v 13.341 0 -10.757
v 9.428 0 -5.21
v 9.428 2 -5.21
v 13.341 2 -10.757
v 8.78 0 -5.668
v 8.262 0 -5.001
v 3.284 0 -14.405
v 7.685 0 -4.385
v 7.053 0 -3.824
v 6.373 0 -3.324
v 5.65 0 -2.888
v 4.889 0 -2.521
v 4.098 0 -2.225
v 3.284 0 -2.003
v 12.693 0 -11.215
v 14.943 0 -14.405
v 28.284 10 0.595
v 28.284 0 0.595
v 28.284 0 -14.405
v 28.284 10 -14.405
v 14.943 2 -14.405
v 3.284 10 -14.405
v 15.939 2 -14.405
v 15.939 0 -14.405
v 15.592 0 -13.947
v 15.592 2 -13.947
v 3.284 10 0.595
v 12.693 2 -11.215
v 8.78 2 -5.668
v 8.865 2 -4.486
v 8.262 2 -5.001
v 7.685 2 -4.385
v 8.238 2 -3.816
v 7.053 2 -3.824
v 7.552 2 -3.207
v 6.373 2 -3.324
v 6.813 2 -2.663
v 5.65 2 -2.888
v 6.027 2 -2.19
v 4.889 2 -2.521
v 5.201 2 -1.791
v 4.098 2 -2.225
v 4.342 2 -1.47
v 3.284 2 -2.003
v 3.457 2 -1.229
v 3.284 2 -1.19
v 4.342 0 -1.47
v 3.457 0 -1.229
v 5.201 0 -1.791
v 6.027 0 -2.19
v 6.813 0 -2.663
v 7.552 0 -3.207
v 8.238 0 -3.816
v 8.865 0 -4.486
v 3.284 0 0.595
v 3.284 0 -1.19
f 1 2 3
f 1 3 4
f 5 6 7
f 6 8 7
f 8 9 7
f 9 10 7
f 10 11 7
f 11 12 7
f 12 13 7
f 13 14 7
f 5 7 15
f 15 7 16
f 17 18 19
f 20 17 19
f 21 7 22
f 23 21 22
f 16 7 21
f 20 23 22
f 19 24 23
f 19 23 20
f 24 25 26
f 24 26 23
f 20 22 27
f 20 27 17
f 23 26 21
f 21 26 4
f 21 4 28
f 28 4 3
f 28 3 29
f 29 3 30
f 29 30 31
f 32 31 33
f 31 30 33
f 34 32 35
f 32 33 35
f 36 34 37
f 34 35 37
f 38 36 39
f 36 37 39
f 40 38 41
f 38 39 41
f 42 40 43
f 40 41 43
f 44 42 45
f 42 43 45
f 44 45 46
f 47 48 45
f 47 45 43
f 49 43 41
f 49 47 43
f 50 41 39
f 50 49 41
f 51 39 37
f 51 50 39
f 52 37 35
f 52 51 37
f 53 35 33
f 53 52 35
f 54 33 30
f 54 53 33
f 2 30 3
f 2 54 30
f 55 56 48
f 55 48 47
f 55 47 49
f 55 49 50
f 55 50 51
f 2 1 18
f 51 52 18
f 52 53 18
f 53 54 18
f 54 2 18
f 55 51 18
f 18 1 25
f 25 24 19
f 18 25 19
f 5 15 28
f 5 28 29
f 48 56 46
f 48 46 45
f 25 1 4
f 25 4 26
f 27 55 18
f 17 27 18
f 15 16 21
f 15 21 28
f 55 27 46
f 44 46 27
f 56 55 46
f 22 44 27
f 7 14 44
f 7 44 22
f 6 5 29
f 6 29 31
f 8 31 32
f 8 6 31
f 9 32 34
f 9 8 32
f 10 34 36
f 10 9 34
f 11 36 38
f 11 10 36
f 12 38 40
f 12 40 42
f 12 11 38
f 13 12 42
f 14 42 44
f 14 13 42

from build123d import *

# Parameters (mm, degrees)
SKETCH3_W           = 25
SKETCH3_H           = 15
BOSS_EXTRUDE1_DEPTH = 10
CUT_EXTRUDE1_DEPTH  = 2


with BuildPart() as part:
    # Sketch3 → Boss-Extrude1 (new body)
    with BuildSketch(Plane(origin=(0, 0, 0), x_dir=(1, 0, 0), z_dir=(0, 1, 0))):
        with Locations((15.783531292, 6.904865991)):
            Rectangle(SKETCH3_W, SKETCH3_H)
    extrude(amount=BOSS_EXTRUDE1_DEPTH)

    # Sketch4 → Cut-Extrude1 (cut)
    with BuildSketch(Plane.XZ):
        with BuildLine():
            Line((9.428221161, -5.210285602), (13.341179834, -10.757171936))
            Line((13.341179834, -10.757171936), (15.591615362, -13.947318093))
            Line((15.591615362, -13.947318093), (15.938880382, -14.404865991))
            Line((15.938880382, -14.404865991), (14.943009948, -14.404865991))
            Line((14.943009948, -14.404865991), (12.69257442, -11.214719833))
            Line((12.69257442, -11.214719833), (8.779615747, -5.667833499))
            ThreePointArc((8.779615747, -5.667833499), (6.372917751, -3.323604758), (3.283531292, -2.003265808))
            Line((3.283531292, -2.003265808), (3.283531292, -1.189966261))
            Line((3.283531292, -1.189966261), (3.456519377, -1.228595436))
            ThreePointArc((3.456519377, -1.228595436), (6.813253572, -2.6631932), (9.428221161, -5.210285602))
        make_face()
    extrude(amount=-CUT_EXTRUDE1_DEPTH, mode=Mode.SUBTRACT)


solid = part.part
